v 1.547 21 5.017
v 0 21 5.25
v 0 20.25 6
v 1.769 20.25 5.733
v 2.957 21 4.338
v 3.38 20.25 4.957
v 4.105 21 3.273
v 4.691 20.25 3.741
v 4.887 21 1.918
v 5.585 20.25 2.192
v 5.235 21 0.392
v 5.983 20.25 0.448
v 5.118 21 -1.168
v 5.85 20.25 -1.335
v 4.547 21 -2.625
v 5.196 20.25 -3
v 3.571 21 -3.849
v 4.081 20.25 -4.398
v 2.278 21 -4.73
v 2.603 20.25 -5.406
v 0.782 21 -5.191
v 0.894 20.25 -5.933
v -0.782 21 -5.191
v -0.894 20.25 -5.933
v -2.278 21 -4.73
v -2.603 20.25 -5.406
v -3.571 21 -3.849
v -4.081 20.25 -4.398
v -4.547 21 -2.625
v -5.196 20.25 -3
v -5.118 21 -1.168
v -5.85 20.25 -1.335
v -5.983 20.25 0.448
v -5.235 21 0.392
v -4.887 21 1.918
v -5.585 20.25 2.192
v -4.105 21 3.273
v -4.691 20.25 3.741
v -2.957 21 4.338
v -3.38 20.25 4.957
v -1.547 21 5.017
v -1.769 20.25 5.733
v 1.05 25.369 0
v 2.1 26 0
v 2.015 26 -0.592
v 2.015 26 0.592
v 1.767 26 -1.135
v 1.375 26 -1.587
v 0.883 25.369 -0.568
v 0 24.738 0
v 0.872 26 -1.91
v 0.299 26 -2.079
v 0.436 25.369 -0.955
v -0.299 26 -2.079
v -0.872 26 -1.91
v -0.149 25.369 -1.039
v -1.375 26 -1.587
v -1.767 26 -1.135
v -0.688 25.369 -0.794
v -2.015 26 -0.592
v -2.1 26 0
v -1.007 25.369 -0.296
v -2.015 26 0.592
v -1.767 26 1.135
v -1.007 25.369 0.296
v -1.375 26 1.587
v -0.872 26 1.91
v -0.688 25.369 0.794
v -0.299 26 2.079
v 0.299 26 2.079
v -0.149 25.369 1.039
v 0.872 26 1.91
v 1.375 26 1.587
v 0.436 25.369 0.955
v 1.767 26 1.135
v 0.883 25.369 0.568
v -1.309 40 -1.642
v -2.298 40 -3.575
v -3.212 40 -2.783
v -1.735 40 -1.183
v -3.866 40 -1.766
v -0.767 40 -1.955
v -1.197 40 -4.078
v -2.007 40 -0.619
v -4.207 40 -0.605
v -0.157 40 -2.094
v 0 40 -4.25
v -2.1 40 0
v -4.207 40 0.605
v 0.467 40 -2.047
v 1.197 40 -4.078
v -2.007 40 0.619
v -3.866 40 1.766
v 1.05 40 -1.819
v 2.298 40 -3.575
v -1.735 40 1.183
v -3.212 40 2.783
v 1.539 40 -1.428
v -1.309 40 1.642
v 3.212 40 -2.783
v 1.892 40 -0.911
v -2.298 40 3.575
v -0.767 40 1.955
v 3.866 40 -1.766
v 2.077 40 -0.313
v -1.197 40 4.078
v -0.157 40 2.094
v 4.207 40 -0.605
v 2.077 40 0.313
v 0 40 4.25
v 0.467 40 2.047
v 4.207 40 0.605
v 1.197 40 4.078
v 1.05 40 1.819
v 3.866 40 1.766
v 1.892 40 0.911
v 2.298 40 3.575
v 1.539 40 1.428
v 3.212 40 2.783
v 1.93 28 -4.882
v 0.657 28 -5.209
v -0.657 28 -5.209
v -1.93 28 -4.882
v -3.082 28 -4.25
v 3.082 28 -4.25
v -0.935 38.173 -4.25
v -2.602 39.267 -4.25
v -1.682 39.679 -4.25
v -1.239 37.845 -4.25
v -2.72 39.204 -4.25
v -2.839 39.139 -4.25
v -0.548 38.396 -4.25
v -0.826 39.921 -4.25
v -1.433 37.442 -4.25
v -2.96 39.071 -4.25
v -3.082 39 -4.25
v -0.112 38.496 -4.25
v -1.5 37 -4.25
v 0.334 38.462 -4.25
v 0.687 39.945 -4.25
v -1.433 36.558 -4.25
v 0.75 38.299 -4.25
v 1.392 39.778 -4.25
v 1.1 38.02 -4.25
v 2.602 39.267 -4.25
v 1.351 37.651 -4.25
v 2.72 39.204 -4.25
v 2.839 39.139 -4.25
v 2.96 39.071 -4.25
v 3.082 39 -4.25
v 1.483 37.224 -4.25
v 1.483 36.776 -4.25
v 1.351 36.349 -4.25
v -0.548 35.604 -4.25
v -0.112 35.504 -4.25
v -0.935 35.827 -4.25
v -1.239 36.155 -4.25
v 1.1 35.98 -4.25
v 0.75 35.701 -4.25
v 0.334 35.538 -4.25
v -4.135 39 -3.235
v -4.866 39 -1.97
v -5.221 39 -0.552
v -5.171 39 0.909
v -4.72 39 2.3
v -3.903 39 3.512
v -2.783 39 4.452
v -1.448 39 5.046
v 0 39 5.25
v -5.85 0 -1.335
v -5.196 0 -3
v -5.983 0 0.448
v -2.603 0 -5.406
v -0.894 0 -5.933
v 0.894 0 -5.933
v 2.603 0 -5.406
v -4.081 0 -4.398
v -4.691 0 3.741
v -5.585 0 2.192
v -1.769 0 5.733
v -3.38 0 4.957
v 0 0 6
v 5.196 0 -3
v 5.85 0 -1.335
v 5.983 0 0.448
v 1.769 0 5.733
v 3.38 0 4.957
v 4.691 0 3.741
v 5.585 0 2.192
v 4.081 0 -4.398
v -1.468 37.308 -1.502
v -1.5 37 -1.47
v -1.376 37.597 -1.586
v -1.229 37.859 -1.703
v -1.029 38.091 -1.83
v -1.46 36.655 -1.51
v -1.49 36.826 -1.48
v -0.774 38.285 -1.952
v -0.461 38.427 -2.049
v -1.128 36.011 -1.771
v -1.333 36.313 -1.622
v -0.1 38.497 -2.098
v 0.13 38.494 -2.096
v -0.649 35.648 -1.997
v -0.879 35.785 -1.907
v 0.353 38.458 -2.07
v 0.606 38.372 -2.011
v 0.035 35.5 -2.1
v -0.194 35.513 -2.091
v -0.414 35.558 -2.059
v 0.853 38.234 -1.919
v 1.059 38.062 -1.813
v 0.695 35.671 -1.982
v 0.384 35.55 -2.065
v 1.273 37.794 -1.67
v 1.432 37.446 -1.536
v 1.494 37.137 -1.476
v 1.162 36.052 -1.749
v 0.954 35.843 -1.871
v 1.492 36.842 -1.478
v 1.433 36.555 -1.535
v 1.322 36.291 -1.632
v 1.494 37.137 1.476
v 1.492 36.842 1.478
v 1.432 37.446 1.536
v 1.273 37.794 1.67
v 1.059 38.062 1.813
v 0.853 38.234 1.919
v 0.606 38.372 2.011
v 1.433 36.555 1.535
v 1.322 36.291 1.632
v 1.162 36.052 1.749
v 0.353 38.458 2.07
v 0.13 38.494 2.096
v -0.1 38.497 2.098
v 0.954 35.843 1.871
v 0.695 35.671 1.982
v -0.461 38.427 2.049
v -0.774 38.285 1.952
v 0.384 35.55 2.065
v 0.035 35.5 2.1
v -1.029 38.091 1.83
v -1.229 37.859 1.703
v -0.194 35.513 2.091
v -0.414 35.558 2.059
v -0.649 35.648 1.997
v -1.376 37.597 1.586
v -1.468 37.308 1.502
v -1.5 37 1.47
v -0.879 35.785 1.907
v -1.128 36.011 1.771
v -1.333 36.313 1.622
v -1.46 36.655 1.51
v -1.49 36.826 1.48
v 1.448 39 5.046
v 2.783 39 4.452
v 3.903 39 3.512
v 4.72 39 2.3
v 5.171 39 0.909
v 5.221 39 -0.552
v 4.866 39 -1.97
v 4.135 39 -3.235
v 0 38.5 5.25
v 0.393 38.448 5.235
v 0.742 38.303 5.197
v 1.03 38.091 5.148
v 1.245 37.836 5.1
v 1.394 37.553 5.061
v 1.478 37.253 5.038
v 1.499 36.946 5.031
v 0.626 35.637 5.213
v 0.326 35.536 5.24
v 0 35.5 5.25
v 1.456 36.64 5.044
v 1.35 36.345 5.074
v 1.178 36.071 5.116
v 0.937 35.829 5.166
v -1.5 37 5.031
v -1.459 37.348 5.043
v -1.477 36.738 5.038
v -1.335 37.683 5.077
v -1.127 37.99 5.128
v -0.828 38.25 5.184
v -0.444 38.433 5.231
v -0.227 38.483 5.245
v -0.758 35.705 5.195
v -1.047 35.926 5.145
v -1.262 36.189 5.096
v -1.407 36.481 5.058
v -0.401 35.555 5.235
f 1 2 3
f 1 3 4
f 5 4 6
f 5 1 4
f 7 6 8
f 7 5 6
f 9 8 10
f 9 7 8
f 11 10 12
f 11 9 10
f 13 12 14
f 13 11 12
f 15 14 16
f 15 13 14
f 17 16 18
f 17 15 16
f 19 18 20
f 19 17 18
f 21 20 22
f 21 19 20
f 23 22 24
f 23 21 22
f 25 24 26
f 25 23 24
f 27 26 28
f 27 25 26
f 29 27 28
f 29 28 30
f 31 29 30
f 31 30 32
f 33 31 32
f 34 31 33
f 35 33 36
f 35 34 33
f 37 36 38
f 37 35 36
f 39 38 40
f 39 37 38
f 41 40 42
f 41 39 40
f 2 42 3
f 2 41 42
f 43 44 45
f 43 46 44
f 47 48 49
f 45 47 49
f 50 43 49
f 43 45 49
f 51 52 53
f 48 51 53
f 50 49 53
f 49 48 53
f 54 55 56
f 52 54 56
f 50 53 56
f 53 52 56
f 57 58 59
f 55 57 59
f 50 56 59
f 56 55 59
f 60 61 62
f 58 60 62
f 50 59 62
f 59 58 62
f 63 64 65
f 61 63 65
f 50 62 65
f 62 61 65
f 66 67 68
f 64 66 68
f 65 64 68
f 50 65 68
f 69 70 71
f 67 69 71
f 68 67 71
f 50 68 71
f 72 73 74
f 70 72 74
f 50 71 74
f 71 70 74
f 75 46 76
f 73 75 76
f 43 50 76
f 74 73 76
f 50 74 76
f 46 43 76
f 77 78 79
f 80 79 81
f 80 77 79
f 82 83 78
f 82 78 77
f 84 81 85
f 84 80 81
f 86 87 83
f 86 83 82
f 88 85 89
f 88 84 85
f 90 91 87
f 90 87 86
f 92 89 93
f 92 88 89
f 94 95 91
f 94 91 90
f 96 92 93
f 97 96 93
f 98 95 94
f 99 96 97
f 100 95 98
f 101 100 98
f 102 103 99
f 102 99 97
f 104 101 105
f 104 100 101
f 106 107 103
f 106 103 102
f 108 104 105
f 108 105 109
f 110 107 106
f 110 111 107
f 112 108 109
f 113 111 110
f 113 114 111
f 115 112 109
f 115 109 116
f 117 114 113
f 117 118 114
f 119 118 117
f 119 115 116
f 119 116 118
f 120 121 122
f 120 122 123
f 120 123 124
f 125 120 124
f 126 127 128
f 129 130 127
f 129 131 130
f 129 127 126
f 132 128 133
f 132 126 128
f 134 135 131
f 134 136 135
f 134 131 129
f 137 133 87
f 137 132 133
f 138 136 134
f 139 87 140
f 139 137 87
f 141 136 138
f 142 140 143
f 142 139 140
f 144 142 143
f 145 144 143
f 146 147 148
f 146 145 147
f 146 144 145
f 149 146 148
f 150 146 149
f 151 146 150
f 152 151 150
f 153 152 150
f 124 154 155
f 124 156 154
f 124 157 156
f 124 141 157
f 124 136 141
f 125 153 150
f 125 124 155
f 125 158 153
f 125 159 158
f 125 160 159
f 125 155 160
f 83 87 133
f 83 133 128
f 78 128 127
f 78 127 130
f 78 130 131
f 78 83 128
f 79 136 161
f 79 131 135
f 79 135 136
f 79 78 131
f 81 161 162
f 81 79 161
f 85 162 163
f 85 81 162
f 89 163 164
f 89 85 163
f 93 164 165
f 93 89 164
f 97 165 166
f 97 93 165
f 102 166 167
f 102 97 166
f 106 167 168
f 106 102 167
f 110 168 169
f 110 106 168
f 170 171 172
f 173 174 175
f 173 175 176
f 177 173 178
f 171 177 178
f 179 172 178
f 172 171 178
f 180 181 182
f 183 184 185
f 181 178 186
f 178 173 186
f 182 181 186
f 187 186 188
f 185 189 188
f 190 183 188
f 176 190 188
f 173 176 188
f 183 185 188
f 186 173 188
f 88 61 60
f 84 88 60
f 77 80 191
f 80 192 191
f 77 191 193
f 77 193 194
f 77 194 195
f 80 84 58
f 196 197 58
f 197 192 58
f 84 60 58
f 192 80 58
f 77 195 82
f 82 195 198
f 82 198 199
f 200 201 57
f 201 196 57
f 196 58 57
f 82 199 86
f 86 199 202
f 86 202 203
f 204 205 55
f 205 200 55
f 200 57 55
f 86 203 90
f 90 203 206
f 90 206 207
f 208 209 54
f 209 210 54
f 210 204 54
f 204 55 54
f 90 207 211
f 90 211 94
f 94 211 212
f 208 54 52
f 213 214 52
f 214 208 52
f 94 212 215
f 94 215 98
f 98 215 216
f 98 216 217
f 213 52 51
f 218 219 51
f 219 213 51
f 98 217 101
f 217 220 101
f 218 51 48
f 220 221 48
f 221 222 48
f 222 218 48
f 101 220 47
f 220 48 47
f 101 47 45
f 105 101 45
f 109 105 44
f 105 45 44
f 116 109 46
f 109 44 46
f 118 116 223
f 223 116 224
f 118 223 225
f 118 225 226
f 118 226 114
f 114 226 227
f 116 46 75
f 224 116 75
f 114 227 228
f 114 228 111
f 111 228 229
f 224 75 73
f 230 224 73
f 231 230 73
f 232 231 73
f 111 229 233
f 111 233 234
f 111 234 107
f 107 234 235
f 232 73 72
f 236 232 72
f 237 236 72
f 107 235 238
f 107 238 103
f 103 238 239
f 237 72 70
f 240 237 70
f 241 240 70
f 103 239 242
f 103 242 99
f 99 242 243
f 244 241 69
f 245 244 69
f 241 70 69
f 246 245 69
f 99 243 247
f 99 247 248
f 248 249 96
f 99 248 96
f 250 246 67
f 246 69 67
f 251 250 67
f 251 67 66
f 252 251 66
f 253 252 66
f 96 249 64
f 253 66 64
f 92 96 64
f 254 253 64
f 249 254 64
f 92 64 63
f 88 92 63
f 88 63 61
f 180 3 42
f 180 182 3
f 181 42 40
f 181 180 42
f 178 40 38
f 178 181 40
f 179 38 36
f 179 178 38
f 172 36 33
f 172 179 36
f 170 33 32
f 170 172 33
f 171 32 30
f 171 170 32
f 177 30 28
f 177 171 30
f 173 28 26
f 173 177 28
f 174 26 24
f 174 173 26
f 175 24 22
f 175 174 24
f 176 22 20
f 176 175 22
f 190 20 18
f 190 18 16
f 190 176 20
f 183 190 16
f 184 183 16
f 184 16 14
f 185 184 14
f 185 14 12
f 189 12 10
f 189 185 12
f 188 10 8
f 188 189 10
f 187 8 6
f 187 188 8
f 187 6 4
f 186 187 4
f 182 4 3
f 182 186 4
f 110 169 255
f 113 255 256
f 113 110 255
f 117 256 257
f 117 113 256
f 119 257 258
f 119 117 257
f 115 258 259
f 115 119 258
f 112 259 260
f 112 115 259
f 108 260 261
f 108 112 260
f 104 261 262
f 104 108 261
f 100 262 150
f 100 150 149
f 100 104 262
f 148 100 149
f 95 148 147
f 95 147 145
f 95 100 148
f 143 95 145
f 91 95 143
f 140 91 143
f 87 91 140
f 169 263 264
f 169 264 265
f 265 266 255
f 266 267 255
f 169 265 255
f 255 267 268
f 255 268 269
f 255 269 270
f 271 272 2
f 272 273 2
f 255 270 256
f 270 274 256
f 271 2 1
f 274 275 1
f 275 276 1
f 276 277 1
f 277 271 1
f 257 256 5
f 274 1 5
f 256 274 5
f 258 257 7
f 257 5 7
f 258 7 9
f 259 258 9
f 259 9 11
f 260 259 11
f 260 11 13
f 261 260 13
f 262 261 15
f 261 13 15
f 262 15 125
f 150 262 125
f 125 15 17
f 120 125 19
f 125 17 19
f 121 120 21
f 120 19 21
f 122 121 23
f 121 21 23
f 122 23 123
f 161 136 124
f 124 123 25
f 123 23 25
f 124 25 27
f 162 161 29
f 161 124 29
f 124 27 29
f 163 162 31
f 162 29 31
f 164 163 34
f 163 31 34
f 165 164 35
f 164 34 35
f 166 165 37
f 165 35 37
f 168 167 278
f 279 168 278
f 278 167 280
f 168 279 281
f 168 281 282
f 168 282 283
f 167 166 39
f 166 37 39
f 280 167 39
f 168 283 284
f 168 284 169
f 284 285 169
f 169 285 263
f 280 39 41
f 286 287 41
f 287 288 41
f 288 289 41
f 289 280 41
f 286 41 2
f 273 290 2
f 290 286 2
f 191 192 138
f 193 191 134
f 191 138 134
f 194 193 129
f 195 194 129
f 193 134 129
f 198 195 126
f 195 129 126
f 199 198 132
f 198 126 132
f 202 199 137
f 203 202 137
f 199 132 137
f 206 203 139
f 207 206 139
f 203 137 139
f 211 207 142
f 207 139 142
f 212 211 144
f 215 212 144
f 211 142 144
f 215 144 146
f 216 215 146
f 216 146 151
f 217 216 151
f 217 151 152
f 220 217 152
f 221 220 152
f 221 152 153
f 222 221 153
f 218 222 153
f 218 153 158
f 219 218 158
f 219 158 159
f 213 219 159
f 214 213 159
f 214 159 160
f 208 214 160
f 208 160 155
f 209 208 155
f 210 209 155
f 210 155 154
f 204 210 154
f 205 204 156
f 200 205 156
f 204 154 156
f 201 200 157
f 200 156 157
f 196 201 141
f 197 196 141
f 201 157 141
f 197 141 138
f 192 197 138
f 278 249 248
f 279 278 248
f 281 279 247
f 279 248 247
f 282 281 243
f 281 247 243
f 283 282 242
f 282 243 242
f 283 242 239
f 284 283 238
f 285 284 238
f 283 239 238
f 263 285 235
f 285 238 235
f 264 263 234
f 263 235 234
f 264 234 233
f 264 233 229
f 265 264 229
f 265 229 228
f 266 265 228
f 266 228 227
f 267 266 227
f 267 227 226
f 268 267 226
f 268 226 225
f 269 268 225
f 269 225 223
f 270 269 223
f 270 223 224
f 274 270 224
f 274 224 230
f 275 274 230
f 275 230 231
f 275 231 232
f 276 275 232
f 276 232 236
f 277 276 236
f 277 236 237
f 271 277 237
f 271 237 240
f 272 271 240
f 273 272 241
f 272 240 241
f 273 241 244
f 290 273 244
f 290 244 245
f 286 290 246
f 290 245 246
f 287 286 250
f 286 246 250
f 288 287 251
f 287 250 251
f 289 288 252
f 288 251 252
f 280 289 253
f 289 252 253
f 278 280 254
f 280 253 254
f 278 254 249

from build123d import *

# Parameters (mm, degrees)
SKETCH1_R             = 6
BOSS_EXTRUDE1_DEPTH   = 20
SKETCH2_R             = 5.25
BOSS_EXTRUDE2_DEPTH   = 20
CUT_EXTRUDE1_START    = -12
CUT_EXTRUDE1_DEPTH    = 12
M5_TAPPED_HOLE1_D     = 4.2
M5_TAPPED_HOLE1_DEPTH = 14
M5_TAPPED_HOLE1_TIP   = 1.2618073
SKETCH6_R             = 1.5
CUT_EXTRUDE2_DEPTH    = 42.72604103


with BuildPart() as part:
    # Sketch1 → Boss-Extrude1 (new body)
    with BuildSketch(Plane(origin=(0, 0, 0), x_dir=(1, 0, 0), z_dir=(0, 1, 0))):
        with Locations(Location((0, 0, 0), (0, 0, 270))):
            Circle(SKETCH1_R)
    extrude(amount=BOSS_EXTRUDE1_DEPTH)

    # Sketch2 → Boss-Extrude2 (add)
    with BuildSketch(Plane(origin=(0, 20, 0), x_dir=(1, 0, 0), z_dir=(0, 1, 0))):
        with Locations(Location((0, 0, 0), (0, 0, 270))):
            Circle(SKETCH2_R)
    extrude(amount=BOSS_EXTRUDE2_DEPTH)

    # Sketch3 → Cut-Extrude1 (cut)
    with BuildSketch(Plane(origin=(0, 40, 0), x_dir=(1, 0, 0), z_dir=(0, 1, 0)).offset(CUT_EXTRUDE1_START)):
        with BuildLine():
            Line((-3.082207001, 4.25), (3.082207001, 4.25))
            ThreePointArc((3.082207001, 4.25), (0, 5.25), (-3.082207001, 4.25))
        make_face()
    extrude(amount=CUT_EXTRUDE1_DEPTH, mode=Mode.SUBTRACT)

    # M5 Tapped Hole1
    with Locations(Plane(origin=(0, 40, 0), x_dir=(1, 0, 0), z_dir=(0, 1, 0))):
        with Locations((0, 0)):
            Hole(M5_TAPPED_HOLE1_D / 2, depth=M5_TAPPED_HOLE1_DEPTH)
            with Locations((0, 0, -(M5_TAPPED_HOLE1_DEPTH + M5_TAPPED_HOLE1_TIP / 2))):  # 118° drill point
                Cone(0, M5_TAPPED_HOLE1_D / 2, M5_TAPPED_HOLE1_TIP, mode=Mode.SUBTRACT)

    # Sketch6 → Cut-Extrude2 (cut, through all)
    with BuildSketch(Plane(origin=(0, 0, -4.25), x_dir=(-1, 0, 0), z_dir=(0, 0, -1))):
        with Locations((0, 37)):
            Circle(SKETCH6_R)
    extrude(amount=-CUT_EXTRUDE2_DEPTH, mode=Mode.SUBTRACT)

    # Chamfer1
    # the kernel refuses this chamfer: 1 mm, written as the material it adds along each edge
    with BuildSketch(Plane(origin=(0, 20, 0), x_dir=(0, 0, 1), z_dir=(-1, 0, 0))) as chamfer1_piece_1_section:
        with BuildLine():
            Line((6.278284271, -0.028284271), (5.221715729, 1.028284271))
            Line((5.221715729, 1.028284271), (5.201715729, 1.028284271))
            ThreePointArc((5.201715729, 1.028284271), (5.23, 0.514142136), (5.23, 0))
            Line((5.23, 0), (5.25, -0.02))
            ThreePointArc((5.25, -0.02), (5.764142136, -0.02), (6.278284271, -0.048284271))
            Line((6.278284271, -0.048284271), (6.278284271, -0.028284271))
        make_face()
    chamfer1_piece_1 = revolve(axis=Axis((0, 20, 0), (0, 1, 0)), mode=Mode.PRIVATE)
    chamfer1_piece_1 = chamfer1_piece_1 & Plane(origin=(0, 20.620713895, 0), x_dir=(0, 0, 1), z_dir=(0, -1, 0)) * Cylinder(6, 26, mode=Mode.PRIVATE)
    add(chamfer1_piece_1)
    # the kernel refuses this chamfer: 1 mm, written as the material it takes off along each edge
    with BuildSketch(Plane(origin=(0, 40, 0), x_dir=(0.522159484326456, 0, -0.8528478603642795), z_dir=(0.8528478603642795, 0, 0.522159484326456))) as chamfer1_2_piece_1:
        with BuildLine():
            Line((5.278284271, -1.028284271), (4.221715729, 0.028284271))
            Line((4.221715729, 0.028284271), (4.221715729, 0.048284271))
            ThreePointArc((4.221715729, 0.048284271), (4.735857864, 0.02), (5.25, 0.02))
            Line((5.25, 0.02), (5.27, 0))
            ThreePointArc((5.27, 0), (5.27, -0.514142136), (5.298284271, -1.028284271))
            Line((5.298284271, -1.028284271), (5.278284271, -1.028284271))
        make_face()
    revolve(axis=Axis((0, 40, 0), (0, 1, 0)), revolution_arc=211.477217225, mode=Mode.SUBTRACT)
    with BuildSketch(Plane(origin=(0, 40, 0), x_dir=(0, 0, 1), z_dir=(-1, 0, 0))) as chamfer1_2_piece_2:
        with BuildLine():
            Line((5.278284271, -1.028284271), (4.221715729, 0.028284271))
            Line((4.221715729, 0.028284271), (4.221715729, 0.048284271))
            ThreePointArc((4.221715729, 0.048284271), (4.735857864, 0.02), (5.25, 0.02))
            Line((5.25, 0.02), (5.27, 0))
            ThreePointArc((5.27, 0), (5.27, -0.514142136), (5.298284271, -1.028284271))
            Line((5.298284271, -1.028284271), (5.278284271, -1.028284271))
        make_face()
    revolve(axis=Axis((0, 40, 0), (0, 1, 0)), revolution_arc=211.477217225, mode=Mode.SUBTRACT)


solid = part.part
